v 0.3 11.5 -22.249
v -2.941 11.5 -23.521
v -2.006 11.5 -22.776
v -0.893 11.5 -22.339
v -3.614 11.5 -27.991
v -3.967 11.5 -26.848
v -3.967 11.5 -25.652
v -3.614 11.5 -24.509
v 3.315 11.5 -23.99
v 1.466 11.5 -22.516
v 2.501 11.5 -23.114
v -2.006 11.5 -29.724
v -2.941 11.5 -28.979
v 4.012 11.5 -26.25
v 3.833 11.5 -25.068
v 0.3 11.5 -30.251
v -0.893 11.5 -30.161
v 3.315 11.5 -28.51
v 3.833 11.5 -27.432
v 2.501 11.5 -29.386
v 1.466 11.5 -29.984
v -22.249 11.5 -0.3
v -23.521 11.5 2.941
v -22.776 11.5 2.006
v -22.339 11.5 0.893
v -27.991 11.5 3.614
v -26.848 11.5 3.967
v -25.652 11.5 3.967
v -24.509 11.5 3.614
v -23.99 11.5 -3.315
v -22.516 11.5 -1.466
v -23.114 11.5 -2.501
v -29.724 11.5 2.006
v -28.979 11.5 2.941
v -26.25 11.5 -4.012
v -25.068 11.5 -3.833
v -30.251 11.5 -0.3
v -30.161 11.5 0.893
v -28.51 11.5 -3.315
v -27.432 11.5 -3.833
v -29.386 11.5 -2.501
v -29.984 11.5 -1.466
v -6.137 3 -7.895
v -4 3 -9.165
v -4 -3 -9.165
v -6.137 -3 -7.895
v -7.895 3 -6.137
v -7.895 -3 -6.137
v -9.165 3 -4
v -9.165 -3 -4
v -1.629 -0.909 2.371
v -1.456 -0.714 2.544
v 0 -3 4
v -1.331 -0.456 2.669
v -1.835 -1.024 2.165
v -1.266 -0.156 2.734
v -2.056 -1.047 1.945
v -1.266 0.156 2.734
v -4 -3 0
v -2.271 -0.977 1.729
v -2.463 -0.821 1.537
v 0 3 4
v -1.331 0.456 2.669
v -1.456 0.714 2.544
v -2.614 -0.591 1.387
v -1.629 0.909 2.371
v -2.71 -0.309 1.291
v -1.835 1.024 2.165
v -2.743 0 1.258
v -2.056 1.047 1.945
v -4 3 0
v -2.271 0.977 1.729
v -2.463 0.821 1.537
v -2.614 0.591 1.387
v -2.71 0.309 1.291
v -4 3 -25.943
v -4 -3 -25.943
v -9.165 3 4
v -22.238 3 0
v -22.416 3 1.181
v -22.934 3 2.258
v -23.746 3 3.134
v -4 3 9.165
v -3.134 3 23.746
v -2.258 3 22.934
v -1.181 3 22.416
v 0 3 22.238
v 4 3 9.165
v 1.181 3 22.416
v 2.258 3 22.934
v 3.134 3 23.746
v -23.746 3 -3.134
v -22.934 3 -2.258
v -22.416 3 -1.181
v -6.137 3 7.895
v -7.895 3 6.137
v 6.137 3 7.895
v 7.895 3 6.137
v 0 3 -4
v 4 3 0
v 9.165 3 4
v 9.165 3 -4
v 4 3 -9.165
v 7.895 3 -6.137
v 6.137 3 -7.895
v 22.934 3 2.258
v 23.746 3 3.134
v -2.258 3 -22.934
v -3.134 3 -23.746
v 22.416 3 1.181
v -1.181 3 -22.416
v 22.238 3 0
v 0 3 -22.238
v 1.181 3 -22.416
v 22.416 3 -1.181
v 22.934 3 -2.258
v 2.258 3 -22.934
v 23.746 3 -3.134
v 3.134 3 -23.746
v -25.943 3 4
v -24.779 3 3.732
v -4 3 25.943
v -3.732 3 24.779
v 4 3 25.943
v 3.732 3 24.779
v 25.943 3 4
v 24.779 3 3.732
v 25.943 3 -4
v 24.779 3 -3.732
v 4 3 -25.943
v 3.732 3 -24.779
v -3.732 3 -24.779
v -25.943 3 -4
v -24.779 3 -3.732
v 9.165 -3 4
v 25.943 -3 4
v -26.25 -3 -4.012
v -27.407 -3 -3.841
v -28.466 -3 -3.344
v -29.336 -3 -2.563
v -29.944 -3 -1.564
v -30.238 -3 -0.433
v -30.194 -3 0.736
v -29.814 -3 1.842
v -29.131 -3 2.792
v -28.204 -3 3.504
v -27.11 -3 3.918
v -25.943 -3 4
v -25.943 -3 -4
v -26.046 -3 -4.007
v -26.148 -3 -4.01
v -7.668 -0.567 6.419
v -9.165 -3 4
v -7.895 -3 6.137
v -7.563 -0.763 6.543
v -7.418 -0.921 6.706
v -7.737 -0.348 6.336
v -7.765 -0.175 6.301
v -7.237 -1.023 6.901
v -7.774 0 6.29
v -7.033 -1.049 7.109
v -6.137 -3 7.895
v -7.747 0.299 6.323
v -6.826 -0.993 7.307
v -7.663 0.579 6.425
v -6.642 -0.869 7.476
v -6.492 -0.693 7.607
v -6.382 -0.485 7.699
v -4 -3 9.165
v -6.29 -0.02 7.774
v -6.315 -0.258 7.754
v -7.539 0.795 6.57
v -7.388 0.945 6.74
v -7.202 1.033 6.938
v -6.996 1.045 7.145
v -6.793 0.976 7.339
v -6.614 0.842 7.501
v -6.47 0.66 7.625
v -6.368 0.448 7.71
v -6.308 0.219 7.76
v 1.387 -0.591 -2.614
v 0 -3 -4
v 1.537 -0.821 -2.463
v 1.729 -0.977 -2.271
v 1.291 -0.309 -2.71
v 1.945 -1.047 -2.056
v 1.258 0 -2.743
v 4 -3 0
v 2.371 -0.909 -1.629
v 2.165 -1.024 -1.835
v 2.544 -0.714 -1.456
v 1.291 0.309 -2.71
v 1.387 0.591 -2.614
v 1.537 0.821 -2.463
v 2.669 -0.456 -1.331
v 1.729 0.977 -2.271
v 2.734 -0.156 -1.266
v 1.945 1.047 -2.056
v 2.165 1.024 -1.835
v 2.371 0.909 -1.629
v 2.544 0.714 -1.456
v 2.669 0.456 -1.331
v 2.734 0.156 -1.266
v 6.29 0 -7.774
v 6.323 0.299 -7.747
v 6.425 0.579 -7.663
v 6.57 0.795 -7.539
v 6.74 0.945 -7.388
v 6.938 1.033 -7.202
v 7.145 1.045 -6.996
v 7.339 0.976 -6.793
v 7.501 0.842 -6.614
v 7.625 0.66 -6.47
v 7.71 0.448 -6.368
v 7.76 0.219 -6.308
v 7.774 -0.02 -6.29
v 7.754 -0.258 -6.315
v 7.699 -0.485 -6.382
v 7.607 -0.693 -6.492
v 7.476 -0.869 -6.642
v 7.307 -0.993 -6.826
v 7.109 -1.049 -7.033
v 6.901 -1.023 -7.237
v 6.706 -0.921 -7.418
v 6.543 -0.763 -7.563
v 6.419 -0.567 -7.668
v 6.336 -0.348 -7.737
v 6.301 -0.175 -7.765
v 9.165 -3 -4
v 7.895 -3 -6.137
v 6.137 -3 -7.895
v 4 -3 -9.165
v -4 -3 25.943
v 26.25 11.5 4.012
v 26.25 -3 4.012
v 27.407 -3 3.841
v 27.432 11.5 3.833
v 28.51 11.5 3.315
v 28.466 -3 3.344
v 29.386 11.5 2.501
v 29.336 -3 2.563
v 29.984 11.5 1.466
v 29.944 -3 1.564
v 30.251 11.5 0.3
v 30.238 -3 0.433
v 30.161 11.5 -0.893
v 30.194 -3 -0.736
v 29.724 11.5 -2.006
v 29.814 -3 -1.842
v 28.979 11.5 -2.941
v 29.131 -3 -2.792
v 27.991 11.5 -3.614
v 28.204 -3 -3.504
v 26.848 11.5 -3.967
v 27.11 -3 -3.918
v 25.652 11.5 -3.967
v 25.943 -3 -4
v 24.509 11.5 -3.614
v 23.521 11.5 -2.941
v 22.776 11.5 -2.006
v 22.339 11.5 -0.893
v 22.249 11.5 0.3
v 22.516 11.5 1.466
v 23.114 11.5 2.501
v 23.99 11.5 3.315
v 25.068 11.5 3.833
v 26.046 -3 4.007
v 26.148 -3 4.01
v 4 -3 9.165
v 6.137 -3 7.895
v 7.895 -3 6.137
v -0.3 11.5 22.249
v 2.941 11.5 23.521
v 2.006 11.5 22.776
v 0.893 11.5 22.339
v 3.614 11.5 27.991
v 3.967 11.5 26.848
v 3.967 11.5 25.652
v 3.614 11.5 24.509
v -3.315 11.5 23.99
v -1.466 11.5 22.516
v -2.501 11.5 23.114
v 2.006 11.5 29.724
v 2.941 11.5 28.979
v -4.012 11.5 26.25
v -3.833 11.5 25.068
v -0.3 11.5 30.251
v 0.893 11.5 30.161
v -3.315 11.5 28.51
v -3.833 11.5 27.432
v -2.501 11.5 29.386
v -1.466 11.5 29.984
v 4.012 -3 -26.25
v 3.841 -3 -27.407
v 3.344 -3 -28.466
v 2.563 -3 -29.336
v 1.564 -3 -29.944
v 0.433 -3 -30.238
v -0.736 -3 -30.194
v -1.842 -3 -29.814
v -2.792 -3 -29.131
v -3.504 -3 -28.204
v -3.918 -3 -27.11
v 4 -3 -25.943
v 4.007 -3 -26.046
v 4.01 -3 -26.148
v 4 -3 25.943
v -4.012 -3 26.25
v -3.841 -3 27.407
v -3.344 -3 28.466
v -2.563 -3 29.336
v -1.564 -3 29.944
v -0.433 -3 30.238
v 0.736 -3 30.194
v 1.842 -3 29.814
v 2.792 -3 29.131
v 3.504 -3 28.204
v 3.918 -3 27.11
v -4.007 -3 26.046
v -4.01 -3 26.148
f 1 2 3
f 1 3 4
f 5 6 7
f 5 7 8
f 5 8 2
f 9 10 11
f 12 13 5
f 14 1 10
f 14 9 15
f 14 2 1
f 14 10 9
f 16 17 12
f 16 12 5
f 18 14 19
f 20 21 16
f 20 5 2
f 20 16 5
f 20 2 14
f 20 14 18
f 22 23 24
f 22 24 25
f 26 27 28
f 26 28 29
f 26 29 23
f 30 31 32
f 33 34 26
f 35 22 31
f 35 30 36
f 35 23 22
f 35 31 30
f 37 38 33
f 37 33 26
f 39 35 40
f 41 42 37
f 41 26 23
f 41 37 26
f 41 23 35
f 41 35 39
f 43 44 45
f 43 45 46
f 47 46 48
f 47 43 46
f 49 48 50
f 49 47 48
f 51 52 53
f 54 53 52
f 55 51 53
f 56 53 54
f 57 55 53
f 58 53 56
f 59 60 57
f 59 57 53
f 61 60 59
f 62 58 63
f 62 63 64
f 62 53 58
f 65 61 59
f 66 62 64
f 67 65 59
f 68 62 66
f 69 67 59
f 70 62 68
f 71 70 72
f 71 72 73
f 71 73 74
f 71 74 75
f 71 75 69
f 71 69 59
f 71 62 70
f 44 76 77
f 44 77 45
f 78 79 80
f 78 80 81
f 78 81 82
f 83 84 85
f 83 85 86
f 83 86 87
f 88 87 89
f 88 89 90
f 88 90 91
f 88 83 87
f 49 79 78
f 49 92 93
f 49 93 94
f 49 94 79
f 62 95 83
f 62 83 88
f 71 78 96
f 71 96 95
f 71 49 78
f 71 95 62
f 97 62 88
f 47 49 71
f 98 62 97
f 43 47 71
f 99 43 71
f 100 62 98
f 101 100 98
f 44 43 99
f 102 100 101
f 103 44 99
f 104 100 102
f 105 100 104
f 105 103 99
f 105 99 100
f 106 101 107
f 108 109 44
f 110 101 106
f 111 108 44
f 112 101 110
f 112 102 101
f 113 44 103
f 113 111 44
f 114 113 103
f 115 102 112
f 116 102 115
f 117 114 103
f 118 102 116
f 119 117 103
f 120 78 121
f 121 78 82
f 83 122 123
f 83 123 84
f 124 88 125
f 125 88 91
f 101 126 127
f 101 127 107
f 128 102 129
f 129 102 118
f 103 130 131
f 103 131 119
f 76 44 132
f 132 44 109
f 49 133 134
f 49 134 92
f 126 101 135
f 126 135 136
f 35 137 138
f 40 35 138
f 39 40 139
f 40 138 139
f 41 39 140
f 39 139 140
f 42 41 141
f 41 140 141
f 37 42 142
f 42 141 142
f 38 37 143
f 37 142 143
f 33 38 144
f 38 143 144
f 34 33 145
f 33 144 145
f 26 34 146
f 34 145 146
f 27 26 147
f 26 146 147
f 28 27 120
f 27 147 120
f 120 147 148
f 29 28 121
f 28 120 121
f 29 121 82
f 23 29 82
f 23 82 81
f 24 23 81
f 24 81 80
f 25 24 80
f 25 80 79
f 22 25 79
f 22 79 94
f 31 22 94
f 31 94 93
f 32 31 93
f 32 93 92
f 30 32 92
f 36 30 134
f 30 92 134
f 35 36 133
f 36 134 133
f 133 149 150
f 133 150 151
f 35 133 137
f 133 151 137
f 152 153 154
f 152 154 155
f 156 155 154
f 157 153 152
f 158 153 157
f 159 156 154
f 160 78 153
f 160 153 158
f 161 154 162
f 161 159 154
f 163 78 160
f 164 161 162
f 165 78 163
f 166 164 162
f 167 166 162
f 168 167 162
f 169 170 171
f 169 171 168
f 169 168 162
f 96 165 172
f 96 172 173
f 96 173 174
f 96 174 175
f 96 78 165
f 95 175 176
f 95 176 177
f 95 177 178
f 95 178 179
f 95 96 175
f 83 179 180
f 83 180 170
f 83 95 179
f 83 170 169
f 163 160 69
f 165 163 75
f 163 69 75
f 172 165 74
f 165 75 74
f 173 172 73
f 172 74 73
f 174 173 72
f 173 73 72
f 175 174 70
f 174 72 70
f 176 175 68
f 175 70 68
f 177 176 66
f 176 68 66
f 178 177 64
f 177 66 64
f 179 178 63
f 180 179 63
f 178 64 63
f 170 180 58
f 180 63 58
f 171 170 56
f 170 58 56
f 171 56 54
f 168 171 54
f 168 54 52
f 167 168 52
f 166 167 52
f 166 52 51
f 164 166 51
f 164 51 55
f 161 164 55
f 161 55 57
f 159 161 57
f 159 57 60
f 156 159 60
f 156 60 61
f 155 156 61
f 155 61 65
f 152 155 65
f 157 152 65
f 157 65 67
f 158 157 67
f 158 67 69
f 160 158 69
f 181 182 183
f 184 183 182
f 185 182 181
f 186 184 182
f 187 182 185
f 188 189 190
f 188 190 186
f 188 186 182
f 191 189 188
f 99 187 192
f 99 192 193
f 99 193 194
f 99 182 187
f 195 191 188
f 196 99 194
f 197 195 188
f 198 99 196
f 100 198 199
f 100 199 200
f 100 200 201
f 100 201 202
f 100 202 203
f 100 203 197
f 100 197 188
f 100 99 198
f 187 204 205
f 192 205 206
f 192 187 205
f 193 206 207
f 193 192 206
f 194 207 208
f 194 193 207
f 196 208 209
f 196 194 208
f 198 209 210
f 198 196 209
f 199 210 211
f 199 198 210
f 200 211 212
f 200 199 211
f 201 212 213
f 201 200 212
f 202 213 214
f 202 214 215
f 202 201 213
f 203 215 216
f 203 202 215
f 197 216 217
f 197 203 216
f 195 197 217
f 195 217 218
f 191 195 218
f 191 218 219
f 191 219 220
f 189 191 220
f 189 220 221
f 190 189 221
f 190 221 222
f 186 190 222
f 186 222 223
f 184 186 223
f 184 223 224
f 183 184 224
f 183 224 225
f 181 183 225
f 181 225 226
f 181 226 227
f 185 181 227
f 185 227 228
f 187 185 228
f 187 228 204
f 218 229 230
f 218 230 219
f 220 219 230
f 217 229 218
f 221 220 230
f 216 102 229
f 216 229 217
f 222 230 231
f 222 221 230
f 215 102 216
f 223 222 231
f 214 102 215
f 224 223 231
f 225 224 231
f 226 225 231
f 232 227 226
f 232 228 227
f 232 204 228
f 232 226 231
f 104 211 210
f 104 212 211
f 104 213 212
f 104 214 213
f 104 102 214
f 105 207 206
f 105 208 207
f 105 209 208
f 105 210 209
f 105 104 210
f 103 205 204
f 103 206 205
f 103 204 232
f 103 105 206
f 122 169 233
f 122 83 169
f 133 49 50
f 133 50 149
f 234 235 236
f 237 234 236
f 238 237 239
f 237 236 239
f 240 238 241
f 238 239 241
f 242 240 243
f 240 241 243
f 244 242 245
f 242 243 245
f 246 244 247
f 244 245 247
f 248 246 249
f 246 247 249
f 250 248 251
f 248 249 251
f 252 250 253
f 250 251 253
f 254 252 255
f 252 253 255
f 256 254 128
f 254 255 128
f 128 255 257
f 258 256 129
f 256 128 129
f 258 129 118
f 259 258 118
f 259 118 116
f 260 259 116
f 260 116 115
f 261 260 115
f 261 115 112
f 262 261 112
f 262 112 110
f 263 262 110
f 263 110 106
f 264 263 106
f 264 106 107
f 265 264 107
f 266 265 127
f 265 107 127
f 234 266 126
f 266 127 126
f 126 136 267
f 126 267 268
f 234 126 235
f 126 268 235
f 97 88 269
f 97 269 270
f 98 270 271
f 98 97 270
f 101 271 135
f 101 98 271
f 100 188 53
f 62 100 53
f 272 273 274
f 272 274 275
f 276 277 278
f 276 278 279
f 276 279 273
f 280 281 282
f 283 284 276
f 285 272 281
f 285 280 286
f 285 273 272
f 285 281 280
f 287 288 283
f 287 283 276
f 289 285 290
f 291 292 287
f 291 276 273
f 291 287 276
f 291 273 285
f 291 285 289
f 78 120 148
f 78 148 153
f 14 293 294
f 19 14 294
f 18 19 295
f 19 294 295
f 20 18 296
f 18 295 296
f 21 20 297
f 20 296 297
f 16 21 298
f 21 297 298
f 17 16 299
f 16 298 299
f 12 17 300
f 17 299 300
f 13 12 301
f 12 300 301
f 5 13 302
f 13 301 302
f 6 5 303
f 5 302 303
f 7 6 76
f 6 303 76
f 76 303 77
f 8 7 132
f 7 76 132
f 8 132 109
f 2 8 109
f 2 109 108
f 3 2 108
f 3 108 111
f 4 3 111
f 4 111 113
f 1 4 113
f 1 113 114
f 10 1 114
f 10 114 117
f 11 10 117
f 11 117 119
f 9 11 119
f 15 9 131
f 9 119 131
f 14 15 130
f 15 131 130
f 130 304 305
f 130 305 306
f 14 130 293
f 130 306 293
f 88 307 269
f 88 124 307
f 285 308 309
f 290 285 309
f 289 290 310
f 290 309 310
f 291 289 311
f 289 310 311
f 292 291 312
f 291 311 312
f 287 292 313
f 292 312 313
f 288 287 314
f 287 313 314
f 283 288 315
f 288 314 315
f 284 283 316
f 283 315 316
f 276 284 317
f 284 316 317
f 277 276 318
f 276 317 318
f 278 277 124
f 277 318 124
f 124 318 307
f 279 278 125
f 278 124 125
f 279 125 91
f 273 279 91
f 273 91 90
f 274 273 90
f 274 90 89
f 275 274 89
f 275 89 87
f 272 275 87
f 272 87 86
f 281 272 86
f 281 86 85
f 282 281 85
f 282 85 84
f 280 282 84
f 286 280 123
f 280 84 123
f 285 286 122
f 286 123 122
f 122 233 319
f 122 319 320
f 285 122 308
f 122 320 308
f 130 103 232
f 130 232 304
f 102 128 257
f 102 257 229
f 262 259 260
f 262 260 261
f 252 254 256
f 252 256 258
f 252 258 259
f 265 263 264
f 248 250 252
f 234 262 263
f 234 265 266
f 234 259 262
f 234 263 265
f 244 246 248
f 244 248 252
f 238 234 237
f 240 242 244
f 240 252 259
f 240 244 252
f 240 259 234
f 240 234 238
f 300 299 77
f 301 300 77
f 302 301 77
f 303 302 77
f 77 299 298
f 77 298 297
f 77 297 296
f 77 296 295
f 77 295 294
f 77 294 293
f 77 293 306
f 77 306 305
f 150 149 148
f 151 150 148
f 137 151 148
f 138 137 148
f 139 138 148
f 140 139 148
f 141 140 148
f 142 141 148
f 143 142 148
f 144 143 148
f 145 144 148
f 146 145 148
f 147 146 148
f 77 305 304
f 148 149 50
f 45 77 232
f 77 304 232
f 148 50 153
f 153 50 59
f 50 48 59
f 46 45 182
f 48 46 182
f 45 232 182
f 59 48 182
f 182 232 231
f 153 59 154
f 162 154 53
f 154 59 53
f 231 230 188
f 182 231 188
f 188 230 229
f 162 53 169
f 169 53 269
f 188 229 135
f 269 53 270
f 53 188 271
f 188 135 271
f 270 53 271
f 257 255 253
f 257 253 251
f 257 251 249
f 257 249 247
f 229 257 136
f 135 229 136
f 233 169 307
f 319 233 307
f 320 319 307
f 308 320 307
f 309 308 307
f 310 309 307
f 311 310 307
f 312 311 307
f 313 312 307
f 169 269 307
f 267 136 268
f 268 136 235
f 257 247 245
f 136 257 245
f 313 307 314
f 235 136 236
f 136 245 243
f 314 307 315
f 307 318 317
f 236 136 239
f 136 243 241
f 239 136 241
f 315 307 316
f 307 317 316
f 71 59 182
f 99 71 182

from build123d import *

# Parameters (mm, degrees)
BOSS_EXTRU_1_DEPTH           = 3
BOSS_EXTRU_1_DEPTH_BACK      = 3
BOSS_EXTRU_2_START           = -6
ESQUISSE2_R                  = 4.01172956
BOSS_EXTRU_2_DEPTH           = 14.5
R_P_TITION_CIRCULAIRE1_COUNT = 4
ESQUISSE3_R                  = 1.05
ENL_V_MAT_EXTRU_1_DEPTH      = 43.796548364
ENL_V_MAT_EXTRU_1_DEPTH_BACK = 43.796548364
ENL_V_MAT_EXTRU_2_DEPTH      = 12.5
ENL_V_MAT_EXTRU_2_DEPTH_BACK = 4.0000001


with BuildPart() as part:
    # Esquisse1 → Boss.-Extru.1 (new body, two sides)
    with BuildSketch(Plane(origin=(0, 0, 0), x_dir=(1, 0, 0), z_dir=(0, 1, 0))) as boss_extru_1_sk:
        with BuildLine():
            Line((4, -25.943448113), (4, -9.16515139))
            ThreePointArc((4, -9.16515139), (7.071067812, -7.071067812), (9.16515139, -4))
            Line((9.16515139, -4), (25.943448113, -4))
            ThreePointArc((25.943448113, -4), (26.25, 0), (25.943448113, 4))
            Line((25.943448113, 4), (9.16515139, 4))
            ThreePointArc((9.16515139, 4), (7.071067812, 7.071067812), (4, 9.16515139))
            Line((4, 9.16515139), (4, 25.943448113))
            ThreePointArc((4, 25.943448113), (0, 26.25), (-4, 25.943448113))
            Line((-4, 25.943448113), (-4, 9.16515139))
            ThreePointArc((-4, 9.16515139), (-7.071067812, 7.071067812), (-9.16515139, 4))
            Line((-9.16515139, 4), (-25.943448113, 4))
            ThreePointArc((-25.943448113, 4), (-26.25, 0), (-25.943448113, -4))
            Line((-25.943448113, -4), (-9.16515139, -4))
            ThreePointArc((-9.16515139, -4), (-7.071067812, -7.071067812), (-4, -9.16515139))
            Line((-4, -9.16515139), (-4, -25.943448113))
            ThreePointArc((-4, -25.943448113), (0, -26.25), (4, -25.943448113))
        make_face()
    extrude(amount=BOSS_EXTRU_1_DEPTH)
    extrude(boss_extru_1_sk.sketch, amount=-BOSS_EXTRU_1_DEPTH_BACK)

    # Esquisse2 → Boss.-Extru.2 (add)
    with BuildSketch(Plane(origin=(0, 3, 0), x_dir=(1, 0, 0), z_dir=(0, 1, 0)).offset(BOSS_EXTRU_2_START)):
        with Locations((0, 26.25)):
            Circle(ESQUISSE2_R)
    boss_extru_2 = extrude(amount=BOSS_EXTRU_2_DEPTH)

    # Répétition circulaire1: Boss.-Extru.2 ×4 about axis
    r_p_tition_circulaire1_axis = Axis((0, 0, 0), (0, 1, 0))
    for i in range(1, R_P_TITION_CIRCULAIRE1_COUNT):
        add(boss_extru_2.rotate(r_p_tition_circulaire1_axis, i * 360 / R_P_TITION_CIRCULAIRE1_COUNT))

    # Esquisse3 → Enlèv. mat.-Extru.1 (cut, two sides)
    with BuildSketch(Plane(origin=(0, 0, 0), x_dir=(-0.707106781, 0, -0.707106781), z_dir=(0.707106781, 0, -0.707106781))) as enl_v_mat_extru_1_sk:
        Circle(ESQUISSE3_R)
    extrude(amount=ENL_V_MAT_EXTRU_1_DEPTH, mode=Mode.SUBTRACT)
    extrude(enl_v_mat_extru_1_sk.sketch, amount=-ENL_V_MAT_EXTRU_1_DEPTH_BACK, mode=Mode.SUBTRACT)

    # Esquisse4 → Enlèv. mat.-Extru.2 (cut, two sides)
    with BuildSketch(Plane(origin=(0, 0, 0), x_dir=(1, 0, 0), z_dir=(0, 1, 0))) as enl_v_mat_extru_2_sk:
        Polygon((-4.000103061, 0), (0, 4.000103061), (4.000103061, 0), (0, -4.000103061), align=None)
    extrude(amount=ENL_V_MAT_EXTRU_2_DEPTH, mode=Mode.SUBTRACT)
    extrude(enl_v_mat_extru_2_sk.sketch, amount=-ENL_V_MAT_EXTRU_2_DEPTH_BACK, mode=Mode.SUBTRACT)


solid = part.part
